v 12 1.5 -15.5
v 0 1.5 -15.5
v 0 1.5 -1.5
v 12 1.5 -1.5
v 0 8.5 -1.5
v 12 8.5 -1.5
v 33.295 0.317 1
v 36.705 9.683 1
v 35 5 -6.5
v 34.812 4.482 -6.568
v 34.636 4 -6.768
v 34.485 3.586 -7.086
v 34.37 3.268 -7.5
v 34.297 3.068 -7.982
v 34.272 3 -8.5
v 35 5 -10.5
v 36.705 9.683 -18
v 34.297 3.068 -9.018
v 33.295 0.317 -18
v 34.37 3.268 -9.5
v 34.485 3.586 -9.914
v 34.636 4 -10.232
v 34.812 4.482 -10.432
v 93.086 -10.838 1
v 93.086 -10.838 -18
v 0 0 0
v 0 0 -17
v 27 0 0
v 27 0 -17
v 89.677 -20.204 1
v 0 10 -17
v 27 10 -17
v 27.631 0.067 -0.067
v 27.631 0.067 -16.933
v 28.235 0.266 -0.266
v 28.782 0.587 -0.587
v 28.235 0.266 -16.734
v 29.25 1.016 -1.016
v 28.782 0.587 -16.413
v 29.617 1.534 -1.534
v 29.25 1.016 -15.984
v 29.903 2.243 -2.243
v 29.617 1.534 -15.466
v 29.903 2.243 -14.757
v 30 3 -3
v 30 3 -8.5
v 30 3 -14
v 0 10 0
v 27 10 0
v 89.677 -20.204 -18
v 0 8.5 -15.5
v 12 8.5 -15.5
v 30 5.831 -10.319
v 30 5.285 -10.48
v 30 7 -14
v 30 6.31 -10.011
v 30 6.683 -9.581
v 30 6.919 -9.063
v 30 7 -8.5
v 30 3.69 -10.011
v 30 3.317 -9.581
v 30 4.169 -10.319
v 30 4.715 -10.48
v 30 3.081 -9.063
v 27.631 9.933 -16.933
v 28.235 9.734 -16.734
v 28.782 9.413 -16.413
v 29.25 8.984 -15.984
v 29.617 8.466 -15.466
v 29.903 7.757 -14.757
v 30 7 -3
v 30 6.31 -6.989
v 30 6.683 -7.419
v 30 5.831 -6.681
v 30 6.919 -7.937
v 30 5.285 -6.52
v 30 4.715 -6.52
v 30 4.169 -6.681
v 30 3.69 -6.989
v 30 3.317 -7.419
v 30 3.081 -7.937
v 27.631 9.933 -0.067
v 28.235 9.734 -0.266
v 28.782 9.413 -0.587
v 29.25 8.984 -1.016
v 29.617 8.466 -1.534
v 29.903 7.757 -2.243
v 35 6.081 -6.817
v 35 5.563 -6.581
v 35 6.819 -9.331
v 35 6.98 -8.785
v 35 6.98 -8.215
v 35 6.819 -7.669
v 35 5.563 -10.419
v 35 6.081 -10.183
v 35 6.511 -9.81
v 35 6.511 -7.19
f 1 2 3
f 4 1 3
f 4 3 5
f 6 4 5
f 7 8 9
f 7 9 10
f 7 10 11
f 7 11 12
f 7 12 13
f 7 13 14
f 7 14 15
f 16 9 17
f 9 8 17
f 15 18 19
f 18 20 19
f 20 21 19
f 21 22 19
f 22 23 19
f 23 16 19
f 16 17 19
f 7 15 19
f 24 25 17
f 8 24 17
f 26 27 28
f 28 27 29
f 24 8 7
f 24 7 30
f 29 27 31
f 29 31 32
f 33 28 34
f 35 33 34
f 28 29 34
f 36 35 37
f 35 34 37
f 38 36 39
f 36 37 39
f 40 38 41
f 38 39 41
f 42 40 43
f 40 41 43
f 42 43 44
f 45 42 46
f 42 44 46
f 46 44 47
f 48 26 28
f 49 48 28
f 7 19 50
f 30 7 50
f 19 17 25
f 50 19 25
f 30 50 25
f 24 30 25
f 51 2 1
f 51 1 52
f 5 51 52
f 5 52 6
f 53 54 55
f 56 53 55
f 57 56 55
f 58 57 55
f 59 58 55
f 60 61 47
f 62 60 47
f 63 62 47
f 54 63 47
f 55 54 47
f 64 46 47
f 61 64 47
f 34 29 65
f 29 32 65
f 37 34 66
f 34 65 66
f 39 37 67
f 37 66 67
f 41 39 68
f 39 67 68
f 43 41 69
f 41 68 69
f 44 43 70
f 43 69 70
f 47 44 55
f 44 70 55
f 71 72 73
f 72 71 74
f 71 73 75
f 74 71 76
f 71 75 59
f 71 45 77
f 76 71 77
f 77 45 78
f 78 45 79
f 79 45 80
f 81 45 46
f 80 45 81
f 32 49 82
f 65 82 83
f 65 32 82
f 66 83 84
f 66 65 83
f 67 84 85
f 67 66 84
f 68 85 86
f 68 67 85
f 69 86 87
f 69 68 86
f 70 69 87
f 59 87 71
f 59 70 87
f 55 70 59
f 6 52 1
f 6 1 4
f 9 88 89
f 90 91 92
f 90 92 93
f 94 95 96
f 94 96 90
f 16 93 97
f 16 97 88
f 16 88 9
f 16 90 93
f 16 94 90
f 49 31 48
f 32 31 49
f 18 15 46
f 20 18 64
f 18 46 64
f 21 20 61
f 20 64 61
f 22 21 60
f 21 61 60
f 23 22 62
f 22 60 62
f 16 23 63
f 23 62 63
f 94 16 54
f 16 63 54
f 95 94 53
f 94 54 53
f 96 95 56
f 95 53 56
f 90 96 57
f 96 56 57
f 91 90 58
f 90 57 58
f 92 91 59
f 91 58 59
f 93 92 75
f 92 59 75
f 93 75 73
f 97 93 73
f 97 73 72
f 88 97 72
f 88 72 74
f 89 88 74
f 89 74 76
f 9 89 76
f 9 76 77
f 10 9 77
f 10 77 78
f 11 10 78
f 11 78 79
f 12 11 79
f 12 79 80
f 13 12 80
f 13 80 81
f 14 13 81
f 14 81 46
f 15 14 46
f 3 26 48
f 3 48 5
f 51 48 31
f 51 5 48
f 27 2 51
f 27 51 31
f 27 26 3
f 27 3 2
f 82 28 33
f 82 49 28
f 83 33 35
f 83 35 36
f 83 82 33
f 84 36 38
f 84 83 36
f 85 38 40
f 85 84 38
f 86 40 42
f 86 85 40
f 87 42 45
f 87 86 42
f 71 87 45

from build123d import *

# Parameters (mm, degrees)
SKETCH_1_W           = 30
SKETCH_1_H           = 17
EXTRUDE_1_DEPTH      = 10
SKETCH_2_W           = 14
SKETCH_2_H           = 7
CUT_EXTRUDE_1_DEPTH  = 12
FILLET_1_R           = 3
SKETCH_4_R           = 2
EXTRUDE_2_DEPTH      = 5
EXTRUDE_3_DEPTH      = 1
EXTRUDE_3_DEPTH_BACK = 18


with BuildPart() as part:
    # 草图1 → 凸台-拉伸1 (new body)
    with BuildSketch(Plane(origin=(0, 0, 0), x_dir=(1, 0, 0), z_dir=(0, 1, 0))):
        with Locations((15, 8.5)):
            Rectangle(SKETCH_1_W, SKETCH_1_H)
    extrude(amount=EXTRUDE_1_DEPTH)

    # 草图2 → 切除-拉伸1 (cut)
    with BuildSketch(Plane.ZY):
        with Locations((-8.5, 5)):
            Rectangle(SKETCH_2_W, SKETCH_2_H)
    extrude(amount=-CUT_EXTRUDE_1_DEPTH, mode=Mode.SUBTRACT)

    # 圆角1
    fillet_1_edges = [part.edges().sort_by_distance(p)[0] for p in [
        (30, 10, -8.5),
        (30, 0, -8.5),
        (30, 5, -17),
        (30, 5, 0),
    ]]
    fillet(fillet_1_edges, radius=FILLET_1_R)

    # 草图4 → 凸台-拉伸2 (add)
    with BuildSketch(Plane(origin=(30, 0, 0), x_dir=(0, 0, -1), z_dir=(1, 0, 0))):
        with Locations(Location((8.5, 5, 0), (0, 0, 270))):
            Circle(SKETCH_4_R)
    extrude(amount=EXTRUDE_2_DEPTH)

    # 草图5 → 凸台-拉伸3 (add, two sides: drawn at the far end of the back side and taken through both)
    with BuildSketch(Plane.XY.offset(-EXTRUDE_3_DEPTH_BACK)):
        Polygon((36.704530888, 9.683160127), (33.295469112, 0.316839873), (89.677026359, -20.204368726), (93.086088136, -10.838048473), align=None)
    extrude(amount=EXTRUDE_3_DEPTH + EXTRUDE_3_DEPTH_BACK)


solid = part.part
